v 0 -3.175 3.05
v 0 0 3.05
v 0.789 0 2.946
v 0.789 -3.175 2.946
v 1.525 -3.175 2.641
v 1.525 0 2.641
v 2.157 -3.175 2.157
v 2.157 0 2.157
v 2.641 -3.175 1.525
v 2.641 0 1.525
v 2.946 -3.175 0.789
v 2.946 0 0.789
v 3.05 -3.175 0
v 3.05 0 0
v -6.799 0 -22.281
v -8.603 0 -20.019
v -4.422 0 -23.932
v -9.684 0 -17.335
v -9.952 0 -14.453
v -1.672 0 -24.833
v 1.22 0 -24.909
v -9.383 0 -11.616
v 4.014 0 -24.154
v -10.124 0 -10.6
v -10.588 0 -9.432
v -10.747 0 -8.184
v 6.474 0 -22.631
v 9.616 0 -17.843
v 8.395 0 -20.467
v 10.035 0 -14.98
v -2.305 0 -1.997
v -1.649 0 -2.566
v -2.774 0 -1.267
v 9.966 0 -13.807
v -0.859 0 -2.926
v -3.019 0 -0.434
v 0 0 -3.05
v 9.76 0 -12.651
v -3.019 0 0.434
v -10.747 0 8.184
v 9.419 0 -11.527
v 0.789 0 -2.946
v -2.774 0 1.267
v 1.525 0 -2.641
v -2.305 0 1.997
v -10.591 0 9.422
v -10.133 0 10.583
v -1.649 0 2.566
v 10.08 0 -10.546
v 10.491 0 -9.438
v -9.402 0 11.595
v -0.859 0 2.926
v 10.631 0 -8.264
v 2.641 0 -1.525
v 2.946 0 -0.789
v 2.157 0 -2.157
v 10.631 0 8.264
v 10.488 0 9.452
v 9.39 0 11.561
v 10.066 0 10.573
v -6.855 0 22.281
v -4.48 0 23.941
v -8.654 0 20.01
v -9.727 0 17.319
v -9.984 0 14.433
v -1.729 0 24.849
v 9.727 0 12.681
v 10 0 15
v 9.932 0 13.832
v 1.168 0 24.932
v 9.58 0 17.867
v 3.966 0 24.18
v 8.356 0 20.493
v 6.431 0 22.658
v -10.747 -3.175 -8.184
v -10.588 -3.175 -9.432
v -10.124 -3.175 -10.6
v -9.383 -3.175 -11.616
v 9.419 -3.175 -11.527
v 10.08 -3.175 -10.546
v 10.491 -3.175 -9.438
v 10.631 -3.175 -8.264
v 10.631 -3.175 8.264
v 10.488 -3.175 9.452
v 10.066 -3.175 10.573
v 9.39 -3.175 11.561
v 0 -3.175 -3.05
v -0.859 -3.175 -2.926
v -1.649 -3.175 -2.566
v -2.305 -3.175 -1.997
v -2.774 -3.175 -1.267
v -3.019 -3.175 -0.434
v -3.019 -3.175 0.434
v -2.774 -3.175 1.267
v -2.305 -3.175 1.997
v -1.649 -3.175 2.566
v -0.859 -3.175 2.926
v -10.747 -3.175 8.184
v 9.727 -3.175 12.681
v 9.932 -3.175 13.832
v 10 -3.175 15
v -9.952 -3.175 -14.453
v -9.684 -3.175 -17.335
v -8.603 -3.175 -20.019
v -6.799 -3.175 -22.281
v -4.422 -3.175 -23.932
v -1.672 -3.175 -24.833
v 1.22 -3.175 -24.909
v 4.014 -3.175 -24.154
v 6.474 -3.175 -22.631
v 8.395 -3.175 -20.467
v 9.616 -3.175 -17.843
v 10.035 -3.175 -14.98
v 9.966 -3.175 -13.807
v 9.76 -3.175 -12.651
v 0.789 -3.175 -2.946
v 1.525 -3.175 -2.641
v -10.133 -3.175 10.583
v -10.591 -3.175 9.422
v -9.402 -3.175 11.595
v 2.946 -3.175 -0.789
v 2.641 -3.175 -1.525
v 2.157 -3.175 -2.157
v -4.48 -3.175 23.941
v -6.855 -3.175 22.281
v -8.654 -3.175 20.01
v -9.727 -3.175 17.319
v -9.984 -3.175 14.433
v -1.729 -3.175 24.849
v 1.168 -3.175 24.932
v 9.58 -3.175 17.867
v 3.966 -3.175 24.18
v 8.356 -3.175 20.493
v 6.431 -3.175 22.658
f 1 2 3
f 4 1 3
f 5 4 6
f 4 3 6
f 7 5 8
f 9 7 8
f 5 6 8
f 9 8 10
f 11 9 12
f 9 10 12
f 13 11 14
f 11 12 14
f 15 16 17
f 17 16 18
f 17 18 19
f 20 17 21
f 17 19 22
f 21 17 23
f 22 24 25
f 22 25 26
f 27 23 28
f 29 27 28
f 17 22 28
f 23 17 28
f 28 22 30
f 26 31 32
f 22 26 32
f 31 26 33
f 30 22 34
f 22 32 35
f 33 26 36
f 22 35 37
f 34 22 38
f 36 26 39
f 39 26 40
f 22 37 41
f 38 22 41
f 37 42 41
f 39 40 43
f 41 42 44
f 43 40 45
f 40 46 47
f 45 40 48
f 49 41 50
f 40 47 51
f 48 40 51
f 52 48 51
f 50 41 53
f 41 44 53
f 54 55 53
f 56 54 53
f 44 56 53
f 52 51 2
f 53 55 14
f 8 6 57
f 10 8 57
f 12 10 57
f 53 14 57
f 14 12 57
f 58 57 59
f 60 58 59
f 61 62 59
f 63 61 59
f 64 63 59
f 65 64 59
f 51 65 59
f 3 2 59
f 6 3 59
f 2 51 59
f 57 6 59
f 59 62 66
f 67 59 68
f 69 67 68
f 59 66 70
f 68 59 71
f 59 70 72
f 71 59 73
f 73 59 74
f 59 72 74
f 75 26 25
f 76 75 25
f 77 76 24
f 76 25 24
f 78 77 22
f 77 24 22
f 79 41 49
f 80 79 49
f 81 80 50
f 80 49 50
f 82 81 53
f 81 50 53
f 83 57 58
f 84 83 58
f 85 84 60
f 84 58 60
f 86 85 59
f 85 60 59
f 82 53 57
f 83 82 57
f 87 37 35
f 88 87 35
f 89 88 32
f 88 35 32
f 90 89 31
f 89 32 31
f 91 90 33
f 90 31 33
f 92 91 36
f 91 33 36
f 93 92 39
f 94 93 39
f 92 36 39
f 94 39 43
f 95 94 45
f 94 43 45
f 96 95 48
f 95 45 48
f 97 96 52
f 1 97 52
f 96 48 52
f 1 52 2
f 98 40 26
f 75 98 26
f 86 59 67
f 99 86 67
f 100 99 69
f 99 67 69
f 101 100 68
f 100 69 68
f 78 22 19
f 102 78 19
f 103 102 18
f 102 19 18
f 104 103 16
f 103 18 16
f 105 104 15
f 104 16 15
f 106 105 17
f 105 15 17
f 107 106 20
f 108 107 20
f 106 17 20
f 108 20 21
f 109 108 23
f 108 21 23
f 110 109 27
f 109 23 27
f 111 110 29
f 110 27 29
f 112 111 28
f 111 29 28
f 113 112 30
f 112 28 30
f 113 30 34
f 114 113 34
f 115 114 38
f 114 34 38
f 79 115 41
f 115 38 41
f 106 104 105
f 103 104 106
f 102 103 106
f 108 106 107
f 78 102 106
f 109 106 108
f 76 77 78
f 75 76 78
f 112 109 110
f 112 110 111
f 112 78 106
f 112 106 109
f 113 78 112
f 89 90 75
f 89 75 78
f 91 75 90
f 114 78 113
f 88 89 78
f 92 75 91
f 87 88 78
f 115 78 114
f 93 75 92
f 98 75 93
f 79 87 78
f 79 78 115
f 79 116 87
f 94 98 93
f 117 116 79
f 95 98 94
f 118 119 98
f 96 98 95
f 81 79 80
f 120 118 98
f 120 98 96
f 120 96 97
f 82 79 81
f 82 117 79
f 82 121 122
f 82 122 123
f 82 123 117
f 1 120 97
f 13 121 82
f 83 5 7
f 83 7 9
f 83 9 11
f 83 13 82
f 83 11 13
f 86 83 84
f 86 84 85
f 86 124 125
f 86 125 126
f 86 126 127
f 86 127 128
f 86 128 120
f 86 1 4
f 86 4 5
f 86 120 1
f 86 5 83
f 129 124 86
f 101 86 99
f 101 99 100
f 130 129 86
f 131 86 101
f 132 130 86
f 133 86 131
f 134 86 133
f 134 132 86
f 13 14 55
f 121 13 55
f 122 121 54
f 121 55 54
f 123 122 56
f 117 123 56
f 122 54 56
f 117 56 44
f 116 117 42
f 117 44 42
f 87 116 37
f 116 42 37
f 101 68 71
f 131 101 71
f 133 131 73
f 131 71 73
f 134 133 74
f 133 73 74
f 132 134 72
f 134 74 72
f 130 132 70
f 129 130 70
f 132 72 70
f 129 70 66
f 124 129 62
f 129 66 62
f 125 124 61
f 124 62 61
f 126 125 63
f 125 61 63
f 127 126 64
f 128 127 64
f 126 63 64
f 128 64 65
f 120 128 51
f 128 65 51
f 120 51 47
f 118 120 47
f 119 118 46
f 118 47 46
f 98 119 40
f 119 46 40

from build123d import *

# Parameters (mm, degrees)
F1_DEPTH = 3.175


# Not quite as in the source:
# - a feature names something its author has since deleted; it is built from what else it names


with BuildPart() as f1:
    # F0 (on Front) → F1 (new body)
    with BuildSketch(Plane.XZ):
        with BuildLine():
            ThreePointArc((0, 3.05), (2.1566756826, 2.1566756826), (3.05, 0))
            ThreePointArc((3.05, 0), (2.1566756826, -2.1566756826), (0, -3.05))
            Line((0, -3.05), (0, -4.9800602682))
            ThreePointArc((0, -4.9800602682), (5.7417944409, -6.7685559702), (9.4194688927, -11.5268782485))
            ThreePointArc((9.4194688927, -11.5268782485), (10.31824899, -10.0042357535), (10.6308735731, -8.2639737901))
            Line((10.6308735731, -8.2639737901), (10.6308735731, 8.2639737901))
            ThreePointArc((10.6308735731, 8.2639737901), (10.3103808484, 10.0252834336), (9.389988909, 11.5607983065))
            ThreePointArc((9.389988909, 11.5607983065), (5.7274768906, 6.8026828494), (0, 5))
            Line((0, 5), (0, 3.05))
        make_face()
        with BuildLine():
            ThreePointArc((0, -3.05), (-3.05, 0), (0, 3.05))
            Line((0, 3.05), (0, 5))
            ThreePointArc((0, 5), (-5.7423447428, 6.8130911295), (-9.4024106226, 11.5949046291))
            ThreePointArc((-9.4024106226, 11.5949046291), (-10.3983579477, 10.0170839844), (-10.7465008538, 8.183992176))
            Line((-10.7465008538, 8.183992176), (-10.7465008538, -8.183992176))
            ThreePointArc((-10.7465008538, -8.183992176), (-10.3930329558, -10.0305401514), (-9.3826050837, -11.6160099542))
            ThreePointArc((-9.3826050837, -11.6160099542), (-5.739751248, -6.8156278258), (0, -4.9800602682))
            Line((0, -4.9800602682), (0, -3.05))
        make_face()
        with BuildLine():
            ThreePointArc((-9.4024106226, 11.5949046291), (-5.7423447428, 6.8130911295), (0, 5))
            Line((0, 5), (0, 15))
            ThreePointArc((0, 15), (-4.5199654888, 14.3027938523), (-8.6197512808, 12.275988264))
            ThreePointArc((-8.6197512808, 12.275988264), (-9.0287945556, 11.9558018286), (-9.4024106226, 11.5949046291))
        make_face()
        with BuildLine():
            Line((0, 15), (0, 5))
            ThreePointArc((0, 5), (5.7274768906, 6.8026828494), (9.389988909, 11.5607983065))
            ThreePointArc((9.389988909, 11.5607983065), (8.9445660683, 12.0082283284), (8.4463103597, 12.3959606852))
            ThreePointArc((8.4463103597, 12.3959606852), (4.4193093195, 14.3342144933), (0, 15))
        make_face()
        with BuildLine():
            ThreePointArc((9.4194688927, -11.5268782485), (5.7417944409, -6.7685559702), (0, -4.9800602682))
            Line((0, -4.9800602682), (0, -15))
            ThreePointArc((0, -15), (4.4193093195, -14.3342144933), (8.4463103597, -12.3959606852))
            ThreePointArc((8.4463103597, -12.3959606852), (8.9613594363, -11.9932986506), (9.4194688927, -11.5268782485))
        make_face()
        with BuildLine():
            Line((0, -15), (0, -4.9800602682))
            ThreePointArc((0, -4.9800602682), (-5.739751248, -6.8156278258), (-9.3826050837, -11.6160099542))
            ThreePointArc((-9.3826050837, -11.6160099542), (-9.0178640795, -11.9652859553), (-8.6197512808, -12.275988264))
            ThreePointArc((-8.6197512808, -12.275988264), (-4.5199654888, -14.3027938523), (0, -15))
        make_face()
        with BuildLine():
            ThreePointArc((-8.6197512808, 12.275988264), (-4.5199654888, 14.3027938523), (0, 15))
            ThreePointArc((0, 15), (4.4193093195, 14.3342144933), (8.4463103597, 12.3959606852))
            ThreePointArc((8.4463103597, 12.3959606852), (8.9445660683, 12.0082283284), (9.389988909, 11.5607983065))
            ThreePointArc((9.389988909, 11.5607983065), (9.8463162932, 13.2535592037), (10, 15))
            ThreePointArc((10, 15), (-1.7285678717, 24.8494696869), (-9.4024106226, 11.5949046291))
            ThreePointArc((-9.4024106226, 11.5949046291), (-9.0287945556, 11.9558018286), (-8.6197512808, 12.275988264))
        make_face()
        with BuildLine():
            ThreePointArc((8.4463103597, -12.3959606852), (4.4193093195, -14.3342144933), (0, -15))
            ThreePointArc((0, -15), (-4.5199654888, -14.3027938523), (-8.6197512808, -12.275988264))
            ThreePointArc((-8.6197512808, -12.275988264), (-9.0178640795, -11.9652859553), (-9.3826050837, -11.6160099542))
            ThreePointArc((-9.3826050837, -11.6160099542), (-1.6724608086, -24.8332220833), (10.0345902517, -14.9800004438))
            ThreePointArc((10.0345902517, -14.9800004438), (9.8796089518, -13.2262596432), (9.4194688927, -11.5268782485))
            ThreePointArc((9.4194688927, -11.5268782485), (8.9613594363, -11.9932986506), (8.4463103597, -12.3959606852))
        make_face()
    extrude(amount=F1_DEPTH)


solid = f1.part
